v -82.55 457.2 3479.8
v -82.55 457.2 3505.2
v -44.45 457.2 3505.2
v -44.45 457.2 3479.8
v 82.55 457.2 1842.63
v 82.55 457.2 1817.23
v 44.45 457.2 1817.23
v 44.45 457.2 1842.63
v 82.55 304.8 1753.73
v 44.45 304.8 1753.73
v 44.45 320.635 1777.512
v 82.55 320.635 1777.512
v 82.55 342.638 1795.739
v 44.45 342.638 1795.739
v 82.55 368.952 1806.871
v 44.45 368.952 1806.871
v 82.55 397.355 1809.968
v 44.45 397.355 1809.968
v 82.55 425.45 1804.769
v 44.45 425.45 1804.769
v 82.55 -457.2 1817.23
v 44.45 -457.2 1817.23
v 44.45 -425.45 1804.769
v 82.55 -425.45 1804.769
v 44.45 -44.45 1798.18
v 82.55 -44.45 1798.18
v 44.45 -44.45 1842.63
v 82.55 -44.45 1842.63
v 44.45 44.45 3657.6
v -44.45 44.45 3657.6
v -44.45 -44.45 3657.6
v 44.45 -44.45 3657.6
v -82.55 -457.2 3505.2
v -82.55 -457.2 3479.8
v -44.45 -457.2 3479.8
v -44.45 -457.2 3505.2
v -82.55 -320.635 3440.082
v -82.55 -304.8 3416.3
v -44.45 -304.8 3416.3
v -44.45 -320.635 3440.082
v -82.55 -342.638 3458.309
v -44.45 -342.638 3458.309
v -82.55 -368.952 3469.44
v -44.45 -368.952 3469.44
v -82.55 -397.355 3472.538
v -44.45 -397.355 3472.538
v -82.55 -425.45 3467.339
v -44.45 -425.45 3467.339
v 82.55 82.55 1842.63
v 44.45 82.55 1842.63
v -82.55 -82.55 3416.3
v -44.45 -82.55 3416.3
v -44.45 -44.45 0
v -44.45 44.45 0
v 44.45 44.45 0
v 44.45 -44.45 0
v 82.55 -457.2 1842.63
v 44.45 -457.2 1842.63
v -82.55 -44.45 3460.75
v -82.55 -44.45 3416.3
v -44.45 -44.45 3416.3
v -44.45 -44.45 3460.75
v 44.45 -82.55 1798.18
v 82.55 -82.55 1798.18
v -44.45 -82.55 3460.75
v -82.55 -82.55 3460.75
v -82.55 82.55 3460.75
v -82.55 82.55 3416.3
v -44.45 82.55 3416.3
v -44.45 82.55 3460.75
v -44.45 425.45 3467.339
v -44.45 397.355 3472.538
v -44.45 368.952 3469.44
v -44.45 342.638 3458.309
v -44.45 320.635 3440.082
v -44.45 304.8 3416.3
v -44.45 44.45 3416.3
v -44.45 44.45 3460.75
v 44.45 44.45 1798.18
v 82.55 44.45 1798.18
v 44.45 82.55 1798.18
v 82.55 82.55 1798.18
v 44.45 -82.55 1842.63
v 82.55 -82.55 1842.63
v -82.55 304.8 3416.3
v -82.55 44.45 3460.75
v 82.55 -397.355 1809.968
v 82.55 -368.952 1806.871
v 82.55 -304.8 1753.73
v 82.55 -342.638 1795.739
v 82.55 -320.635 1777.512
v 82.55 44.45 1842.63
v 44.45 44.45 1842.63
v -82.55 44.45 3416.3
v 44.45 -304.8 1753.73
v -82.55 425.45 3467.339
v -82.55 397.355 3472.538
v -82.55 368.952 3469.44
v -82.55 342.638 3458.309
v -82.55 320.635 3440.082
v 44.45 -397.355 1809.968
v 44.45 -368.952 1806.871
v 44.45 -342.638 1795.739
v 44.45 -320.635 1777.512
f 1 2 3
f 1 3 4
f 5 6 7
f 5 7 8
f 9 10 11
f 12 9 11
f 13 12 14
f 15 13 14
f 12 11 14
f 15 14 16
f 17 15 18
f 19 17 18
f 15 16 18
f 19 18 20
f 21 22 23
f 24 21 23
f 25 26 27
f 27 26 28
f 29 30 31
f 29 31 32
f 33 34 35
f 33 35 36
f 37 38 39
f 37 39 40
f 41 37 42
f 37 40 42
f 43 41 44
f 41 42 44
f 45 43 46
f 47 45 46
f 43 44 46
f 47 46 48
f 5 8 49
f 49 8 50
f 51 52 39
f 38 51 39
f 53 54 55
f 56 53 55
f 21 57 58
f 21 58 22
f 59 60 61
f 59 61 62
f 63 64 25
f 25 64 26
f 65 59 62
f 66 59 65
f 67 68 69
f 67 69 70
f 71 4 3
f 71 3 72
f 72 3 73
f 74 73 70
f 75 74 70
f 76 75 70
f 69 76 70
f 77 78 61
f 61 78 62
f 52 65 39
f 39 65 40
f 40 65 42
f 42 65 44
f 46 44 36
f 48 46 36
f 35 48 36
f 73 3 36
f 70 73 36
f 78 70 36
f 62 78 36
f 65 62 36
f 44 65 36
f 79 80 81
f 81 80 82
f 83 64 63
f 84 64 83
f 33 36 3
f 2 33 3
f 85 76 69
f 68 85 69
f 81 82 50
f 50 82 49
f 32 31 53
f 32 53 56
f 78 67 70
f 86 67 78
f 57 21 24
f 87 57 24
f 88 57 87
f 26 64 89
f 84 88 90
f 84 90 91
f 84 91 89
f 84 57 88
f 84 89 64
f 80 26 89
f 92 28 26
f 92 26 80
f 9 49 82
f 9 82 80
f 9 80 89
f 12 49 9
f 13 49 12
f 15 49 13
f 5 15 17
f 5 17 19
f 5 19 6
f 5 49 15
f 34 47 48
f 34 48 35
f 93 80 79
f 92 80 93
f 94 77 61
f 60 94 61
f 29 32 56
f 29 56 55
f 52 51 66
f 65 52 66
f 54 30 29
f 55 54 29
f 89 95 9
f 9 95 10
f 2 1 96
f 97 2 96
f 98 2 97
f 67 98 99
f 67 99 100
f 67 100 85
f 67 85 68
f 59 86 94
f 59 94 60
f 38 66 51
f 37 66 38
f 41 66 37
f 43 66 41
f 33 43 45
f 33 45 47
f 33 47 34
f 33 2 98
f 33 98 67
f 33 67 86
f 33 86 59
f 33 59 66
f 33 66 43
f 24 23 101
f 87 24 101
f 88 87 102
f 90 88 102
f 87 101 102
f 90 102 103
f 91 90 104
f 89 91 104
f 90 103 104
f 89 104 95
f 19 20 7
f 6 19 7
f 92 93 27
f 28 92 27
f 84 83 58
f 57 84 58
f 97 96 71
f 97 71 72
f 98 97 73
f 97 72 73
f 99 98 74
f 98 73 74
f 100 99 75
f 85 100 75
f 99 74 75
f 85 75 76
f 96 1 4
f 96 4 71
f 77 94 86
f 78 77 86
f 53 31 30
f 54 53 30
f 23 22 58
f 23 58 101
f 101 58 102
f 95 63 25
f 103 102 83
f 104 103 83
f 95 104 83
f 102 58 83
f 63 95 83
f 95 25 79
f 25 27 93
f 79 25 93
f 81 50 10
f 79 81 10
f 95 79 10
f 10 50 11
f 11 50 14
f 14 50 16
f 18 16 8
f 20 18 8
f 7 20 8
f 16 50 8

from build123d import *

# Parameters (mm, degrees)
F0_W      = 88.9
F0_H      = 88.9
F1_DEPTH  = 3657.6
F2_W      = 88.9
F2_H      = 88.9
F3_DEPTH  = 38.1
F4_W      = 38.1
F4_H      = 44.45
F5_DEPTH  = 254
F6_DEPTH  = 254
F7_W      = 88.9
F7_H      = 88.9
F8_DEPTH  = 38.1
F9_W      = 38.1
F9_H      = 44.45
F10_DEPTH = 254


with BuildPart() as f1:
    # F0 (on Top) → F1 (new body)
    with BuildSketch(Plane.XY):
        Rectangle(F0_W, F0_H)
    extrude(amount=F1_DEPTH)


with BuildPart() as f3:
    # F2 (on face) → F3 (new body)
    with BuildSketch(Plane(origin=(-44.45, 0, 0), x_dir=(0, -1, 0), z_dir=(-1, 0, 0))):
        with BuildLine():
            Line((-44.45, 3505.2), (-457.2, 3505.2))
            Line((-457.2, 3505.2), (-457.2, 3479.8))
            Line((-457.2, 3479.8), (-425.45, 3467.3388344477))
            ThreePointArc((-425.45, 3467.3388344477), (-355.3884967608, 3464.8354035511), (-304.8, 3416.3))
            Line((-304.8, 3416.3), (-44.45, 3416.3))
            Line((-44.45, 3416.3), (-44.45, 3505.2))
        make_face()
        with BuildLine():
            Line((457.2, 3505.2), (44.45, 3505.2))
            Line((44.45, 3505.2), (44.45, 3416.3))
            Line((44.45, 3416.3), (304.8, 3416.3))
            ThreePointArc((304.8, 3416.3), (355.3884967608, 3464.8354035511), (425.45, 3467.3388344477))
            Line((425.45, 3467.3388344477), (457.2, 3479.8))
            Line((457.2, 3479.8), (457.2, 3505.2))
        make_face()
        with Locations((0, 3460.75)):
            Rectangle(F2_W, F2_H)
    extrude(amount=F3_DEPTH)

    # F4 (on face) → F5 (cut)
    with BuildSketch(Plane(origin=(-82.55, 0, 0), x_dir=(0, -1, 0), z_dir=(-1, 0, 0))):
        with Locations((63.5, 3438.525)):
            Rectangle(F4_W, F4_H)
    extrude(amount=-F5_DEPTH, mode=Mode.SUBTRACT)

    # F4 (on face) → F6 (cut)
    with BuildSketch(Plane(origin=(-82.55, 0, 0), x_dir=(0, -1, 0), z_dir=(-1, 0, 0))):
        with Locations((-63.5, 3438.525)):
            Rectangle(F4_W, F4_H)
    extrude(amount=-F6_DEPTH, mode=Mode.SUBTRACT)


with BuildPart() as f8:
    # F7 (on face) → F8 (new body)
    with BuildSketch(Plane.YZ.offset(44.45)):
        with BuildLine():
            Line((-44.45, 1842.6301161539), (-457.2, 1842.6301161539))
            Line((-457.2, 1842.6301161539), (-457.2, 1817.2301161539))
            Line((-457.2, 1817.2301161539), (-425.45, 1804.7689506016))
            ThreePointArc((-425.45, 1804.7689506016), (-355.3884967608, 1802.265519705), (-304.8, 1753.7301161539))
            Line((-304.8, 1753.7301161539), (-44.45, 1753.7301161539))
            Line((-44.45, 1753.7301161539), (-44.45, 1842.6301161539))
        make_face()
        with Locations((0, 1798.1801161539)):
            Rectangle(F7_W, F7_H)
        with BuildLine():
            Line((457.2, 1842.6301161539), (44.45, 1842.6301161539))
            Line((44.45, 1842.6301161539), (44.45, 1753.7301161539))
            Line((44.45, 1753.7301161539), (304.8, 1753.7301161539))
            ThreePointArc((304.8, 1753.7301161539), (355.3884967608, 1802.265519705), (425.45, 1804.7689506016))
            Line((425.45, 1804.7689506016), (457.2, 1817.2301161539))
            Line((457.2, 1817.2301161539), (457.2, 1842.6301161539))
        make_face()
    extrude(amount=F8_DEPTH)

    # F9 (on face) → F10 (cut)
    with BuildSketch(Plane.YZ.offset(82.55)):
        with Locations((-63.5, 1820.4051161539)):
            Rectangle(F9_W, F9_H)
        with Locations((63.5, 1820.4051161539)):
            Rectangle(F9_W, F9_H)
    extrude(amount=-F10_DEPTH, mode=Mode.SUBTRACT)


solid = Compound([f1.part, f3.part, f8.part])
